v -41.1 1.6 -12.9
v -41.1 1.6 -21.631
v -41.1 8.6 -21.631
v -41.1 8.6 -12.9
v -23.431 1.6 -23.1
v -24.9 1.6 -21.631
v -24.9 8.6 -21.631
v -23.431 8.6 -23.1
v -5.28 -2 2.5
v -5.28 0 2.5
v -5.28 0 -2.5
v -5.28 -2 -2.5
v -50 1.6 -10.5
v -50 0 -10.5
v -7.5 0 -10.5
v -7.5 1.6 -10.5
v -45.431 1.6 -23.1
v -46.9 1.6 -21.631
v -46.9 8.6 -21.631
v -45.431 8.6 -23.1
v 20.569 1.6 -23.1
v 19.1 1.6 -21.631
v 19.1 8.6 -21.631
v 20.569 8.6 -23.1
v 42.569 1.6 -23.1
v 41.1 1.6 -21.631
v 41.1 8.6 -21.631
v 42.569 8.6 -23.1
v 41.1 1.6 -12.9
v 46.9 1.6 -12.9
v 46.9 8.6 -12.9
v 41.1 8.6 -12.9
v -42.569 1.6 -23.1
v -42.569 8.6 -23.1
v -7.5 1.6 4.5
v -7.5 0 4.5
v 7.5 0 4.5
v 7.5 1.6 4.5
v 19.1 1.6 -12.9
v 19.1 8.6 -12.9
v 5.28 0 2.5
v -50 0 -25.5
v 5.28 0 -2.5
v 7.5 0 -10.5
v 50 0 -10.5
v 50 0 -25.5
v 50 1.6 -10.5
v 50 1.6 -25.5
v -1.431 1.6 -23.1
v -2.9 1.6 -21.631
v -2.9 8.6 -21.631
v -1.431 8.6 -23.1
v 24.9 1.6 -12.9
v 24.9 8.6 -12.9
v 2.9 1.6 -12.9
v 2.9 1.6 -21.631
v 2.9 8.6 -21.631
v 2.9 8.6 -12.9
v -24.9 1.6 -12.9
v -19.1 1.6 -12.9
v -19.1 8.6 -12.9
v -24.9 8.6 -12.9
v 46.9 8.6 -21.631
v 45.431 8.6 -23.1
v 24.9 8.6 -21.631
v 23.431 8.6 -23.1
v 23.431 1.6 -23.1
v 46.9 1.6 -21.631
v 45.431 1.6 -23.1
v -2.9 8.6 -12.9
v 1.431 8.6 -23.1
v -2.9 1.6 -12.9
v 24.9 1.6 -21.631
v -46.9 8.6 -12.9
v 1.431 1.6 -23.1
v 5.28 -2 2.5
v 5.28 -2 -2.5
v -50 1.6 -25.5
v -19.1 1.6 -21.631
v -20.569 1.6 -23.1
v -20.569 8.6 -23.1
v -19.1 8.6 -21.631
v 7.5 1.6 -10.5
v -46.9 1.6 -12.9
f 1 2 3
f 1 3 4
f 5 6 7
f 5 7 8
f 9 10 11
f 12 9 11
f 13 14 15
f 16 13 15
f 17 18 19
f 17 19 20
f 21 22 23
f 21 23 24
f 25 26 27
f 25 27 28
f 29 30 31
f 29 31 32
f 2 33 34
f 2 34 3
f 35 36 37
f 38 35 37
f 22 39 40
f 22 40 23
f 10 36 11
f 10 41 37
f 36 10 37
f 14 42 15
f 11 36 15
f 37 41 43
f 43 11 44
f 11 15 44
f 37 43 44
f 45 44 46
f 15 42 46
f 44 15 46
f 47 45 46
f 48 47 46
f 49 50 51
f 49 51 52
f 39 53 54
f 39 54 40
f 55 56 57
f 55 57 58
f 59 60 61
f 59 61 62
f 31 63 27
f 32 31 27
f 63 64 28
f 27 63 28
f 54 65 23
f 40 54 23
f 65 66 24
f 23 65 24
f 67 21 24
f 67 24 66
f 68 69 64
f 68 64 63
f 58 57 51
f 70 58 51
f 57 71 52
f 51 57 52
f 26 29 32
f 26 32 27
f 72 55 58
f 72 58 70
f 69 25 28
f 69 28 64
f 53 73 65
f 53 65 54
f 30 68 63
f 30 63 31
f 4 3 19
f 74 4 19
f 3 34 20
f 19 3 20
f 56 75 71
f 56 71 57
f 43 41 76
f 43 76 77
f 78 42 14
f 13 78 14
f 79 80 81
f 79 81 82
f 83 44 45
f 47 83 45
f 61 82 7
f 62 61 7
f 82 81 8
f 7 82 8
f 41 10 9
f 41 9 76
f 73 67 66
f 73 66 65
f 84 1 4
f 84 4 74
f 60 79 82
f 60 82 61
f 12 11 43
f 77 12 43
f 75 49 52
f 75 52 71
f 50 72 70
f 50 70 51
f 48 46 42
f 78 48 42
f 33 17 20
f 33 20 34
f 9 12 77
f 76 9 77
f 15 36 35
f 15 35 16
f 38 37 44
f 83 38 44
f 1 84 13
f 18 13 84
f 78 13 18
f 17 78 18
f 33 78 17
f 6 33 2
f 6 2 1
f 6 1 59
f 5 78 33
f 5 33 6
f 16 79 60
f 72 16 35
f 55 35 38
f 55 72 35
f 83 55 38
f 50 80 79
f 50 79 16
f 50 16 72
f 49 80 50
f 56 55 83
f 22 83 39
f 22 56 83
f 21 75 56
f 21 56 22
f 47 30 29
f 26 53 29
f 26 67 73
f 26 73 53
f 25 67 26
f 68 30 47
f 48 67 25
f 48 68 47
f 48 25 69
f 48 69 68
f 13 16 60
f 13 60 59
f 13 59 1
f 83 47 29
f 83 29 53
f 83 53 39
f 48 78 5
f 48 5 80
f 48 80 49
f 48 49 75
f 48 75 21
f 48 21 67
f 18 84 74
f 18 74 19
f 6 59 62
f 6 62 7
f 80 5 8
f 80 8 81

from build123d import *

# Parameters (mm, degrees)
BOSS_EXTRUDE1_DEPTH = 1.6
SKETCH1_3_W         = 10.56
SKETCH1_3_H         = 5
BOSS_EXTRUDE2_DEPTH = 2
BOSS_EXTRUDE3_DEPTH = 8.6


with BuildPart() as part:
    # Sketch1 → Boss-Extrude1 (new body)
    with BuildSketch(Plane(origin=(0, 0, 0), x_dir=(1, 0, 0), z_dir=(0, 1, 0))):
        Polygon((-7.5, 10.5), (-7.5, -4.5), (7.5, -4.5), (7.5, 10.5), (50, 10.5), (50, 25.5), (-50, 25.5), (-50, 10.5), align=None)
        Polygon((46.9, 21.630697763), (46.9, 12.9), (41.1, 12.9), (41.1, 21.630697763), (42.569302237, 23.1), (45.430697763, 23.1), align=None, mode=Mode.SUBTRACT)
        Polygon((-42.569302237, 23.1), (-41.1, 21.630697763), (-41.1, 12.9), (-46.9, 12.9), (-46.9, 21.630697763), (-45.430697763, 23.1), align=None, mode=Mode.SUBTRACT)
        Polygon((-20.569302237, 23.1), (-19.1, 21.630697763), (-19.1, 12.9), (-24.9, 12.9), (-24.9, 21.630697763), (-23.430697763, 23.1), align=None, mode=Mode.SUBTRACT)
        Polygon((2.9, 12.9), (-2.9, 12.9), (-2.9, 21.630697763), (-1.430697763, 23.1), (1.430697763, 23.1), (2.9, 21.630697763), align=None, mode=Mode.SUBTRACT)
        Polygon((23.430697763, 23.1), (24.9, 21.630697763), (24.9, 12.9), (19.1, 12.9), (19.1, 21.630697763), (20.569302237, 23.1), align=None, mode=Mode.SUBTRACT)
    extrude(amount=BOSS_EXTRUDE1_DEPTH)

    # Sketch1<3> → Boss-Extrude2 (add)
    with BuildSketch(Plane(origin=(0, 0, 0), x_dir=(1, 0, 0), z_dir=(0, 1, 0))):
        Rectangle(SKETCH1_3_W, SKETCH1_3_H)
    extrude(amount=-BOSS_EXTRUDE2_DEPTH)

    # Sketch1<4> → Boss-Extrude3 (add)
    with BuildSketch(Plane(origin=(0, 0, 0), x_dir=(1, 0, 0), z_dir=(0, 1, 0))):
        Polygon((-2.9, 21.630697763), (-2.9, 12.9), (2.9, 12.9), (2.9, 21.630697763), (1.430697763, 23.1), (-1.430697763, 23.1), align=None)
        Polygon((24.9, 12.9), (24.9, 21.630697763), (23.430697763, 23.1), (20.569302237, 23.1), (19.1, 21.630697763), (19.1, 12.9), align=None)
        Polygon((46.9, 12.9), (46.9, 21.630697763), (45.430697763, 23.1), (42.569302237, 23.1), (41.1, 21.630697763), (41.1, 12.9), align=None)
        Polygon((-19.1, 12.9), (-19.1, 21.630697763), (-20.569302237, 23.1), (-23.430697763, 23.1), (-24.9, 21.630697763), (-24.9, 12.9), align=None)
        Polygon((-41.1, 12.9), (-41.1, 21.630697763), (-42.569302237, 23.1), (-45.430697763, 23.1), (-46.9, 21.630697763), (-46.9, 12.9), align=None)
    extrude(amount=BOSS_EXTRUDE3_DEPTH)


solid = part.part
